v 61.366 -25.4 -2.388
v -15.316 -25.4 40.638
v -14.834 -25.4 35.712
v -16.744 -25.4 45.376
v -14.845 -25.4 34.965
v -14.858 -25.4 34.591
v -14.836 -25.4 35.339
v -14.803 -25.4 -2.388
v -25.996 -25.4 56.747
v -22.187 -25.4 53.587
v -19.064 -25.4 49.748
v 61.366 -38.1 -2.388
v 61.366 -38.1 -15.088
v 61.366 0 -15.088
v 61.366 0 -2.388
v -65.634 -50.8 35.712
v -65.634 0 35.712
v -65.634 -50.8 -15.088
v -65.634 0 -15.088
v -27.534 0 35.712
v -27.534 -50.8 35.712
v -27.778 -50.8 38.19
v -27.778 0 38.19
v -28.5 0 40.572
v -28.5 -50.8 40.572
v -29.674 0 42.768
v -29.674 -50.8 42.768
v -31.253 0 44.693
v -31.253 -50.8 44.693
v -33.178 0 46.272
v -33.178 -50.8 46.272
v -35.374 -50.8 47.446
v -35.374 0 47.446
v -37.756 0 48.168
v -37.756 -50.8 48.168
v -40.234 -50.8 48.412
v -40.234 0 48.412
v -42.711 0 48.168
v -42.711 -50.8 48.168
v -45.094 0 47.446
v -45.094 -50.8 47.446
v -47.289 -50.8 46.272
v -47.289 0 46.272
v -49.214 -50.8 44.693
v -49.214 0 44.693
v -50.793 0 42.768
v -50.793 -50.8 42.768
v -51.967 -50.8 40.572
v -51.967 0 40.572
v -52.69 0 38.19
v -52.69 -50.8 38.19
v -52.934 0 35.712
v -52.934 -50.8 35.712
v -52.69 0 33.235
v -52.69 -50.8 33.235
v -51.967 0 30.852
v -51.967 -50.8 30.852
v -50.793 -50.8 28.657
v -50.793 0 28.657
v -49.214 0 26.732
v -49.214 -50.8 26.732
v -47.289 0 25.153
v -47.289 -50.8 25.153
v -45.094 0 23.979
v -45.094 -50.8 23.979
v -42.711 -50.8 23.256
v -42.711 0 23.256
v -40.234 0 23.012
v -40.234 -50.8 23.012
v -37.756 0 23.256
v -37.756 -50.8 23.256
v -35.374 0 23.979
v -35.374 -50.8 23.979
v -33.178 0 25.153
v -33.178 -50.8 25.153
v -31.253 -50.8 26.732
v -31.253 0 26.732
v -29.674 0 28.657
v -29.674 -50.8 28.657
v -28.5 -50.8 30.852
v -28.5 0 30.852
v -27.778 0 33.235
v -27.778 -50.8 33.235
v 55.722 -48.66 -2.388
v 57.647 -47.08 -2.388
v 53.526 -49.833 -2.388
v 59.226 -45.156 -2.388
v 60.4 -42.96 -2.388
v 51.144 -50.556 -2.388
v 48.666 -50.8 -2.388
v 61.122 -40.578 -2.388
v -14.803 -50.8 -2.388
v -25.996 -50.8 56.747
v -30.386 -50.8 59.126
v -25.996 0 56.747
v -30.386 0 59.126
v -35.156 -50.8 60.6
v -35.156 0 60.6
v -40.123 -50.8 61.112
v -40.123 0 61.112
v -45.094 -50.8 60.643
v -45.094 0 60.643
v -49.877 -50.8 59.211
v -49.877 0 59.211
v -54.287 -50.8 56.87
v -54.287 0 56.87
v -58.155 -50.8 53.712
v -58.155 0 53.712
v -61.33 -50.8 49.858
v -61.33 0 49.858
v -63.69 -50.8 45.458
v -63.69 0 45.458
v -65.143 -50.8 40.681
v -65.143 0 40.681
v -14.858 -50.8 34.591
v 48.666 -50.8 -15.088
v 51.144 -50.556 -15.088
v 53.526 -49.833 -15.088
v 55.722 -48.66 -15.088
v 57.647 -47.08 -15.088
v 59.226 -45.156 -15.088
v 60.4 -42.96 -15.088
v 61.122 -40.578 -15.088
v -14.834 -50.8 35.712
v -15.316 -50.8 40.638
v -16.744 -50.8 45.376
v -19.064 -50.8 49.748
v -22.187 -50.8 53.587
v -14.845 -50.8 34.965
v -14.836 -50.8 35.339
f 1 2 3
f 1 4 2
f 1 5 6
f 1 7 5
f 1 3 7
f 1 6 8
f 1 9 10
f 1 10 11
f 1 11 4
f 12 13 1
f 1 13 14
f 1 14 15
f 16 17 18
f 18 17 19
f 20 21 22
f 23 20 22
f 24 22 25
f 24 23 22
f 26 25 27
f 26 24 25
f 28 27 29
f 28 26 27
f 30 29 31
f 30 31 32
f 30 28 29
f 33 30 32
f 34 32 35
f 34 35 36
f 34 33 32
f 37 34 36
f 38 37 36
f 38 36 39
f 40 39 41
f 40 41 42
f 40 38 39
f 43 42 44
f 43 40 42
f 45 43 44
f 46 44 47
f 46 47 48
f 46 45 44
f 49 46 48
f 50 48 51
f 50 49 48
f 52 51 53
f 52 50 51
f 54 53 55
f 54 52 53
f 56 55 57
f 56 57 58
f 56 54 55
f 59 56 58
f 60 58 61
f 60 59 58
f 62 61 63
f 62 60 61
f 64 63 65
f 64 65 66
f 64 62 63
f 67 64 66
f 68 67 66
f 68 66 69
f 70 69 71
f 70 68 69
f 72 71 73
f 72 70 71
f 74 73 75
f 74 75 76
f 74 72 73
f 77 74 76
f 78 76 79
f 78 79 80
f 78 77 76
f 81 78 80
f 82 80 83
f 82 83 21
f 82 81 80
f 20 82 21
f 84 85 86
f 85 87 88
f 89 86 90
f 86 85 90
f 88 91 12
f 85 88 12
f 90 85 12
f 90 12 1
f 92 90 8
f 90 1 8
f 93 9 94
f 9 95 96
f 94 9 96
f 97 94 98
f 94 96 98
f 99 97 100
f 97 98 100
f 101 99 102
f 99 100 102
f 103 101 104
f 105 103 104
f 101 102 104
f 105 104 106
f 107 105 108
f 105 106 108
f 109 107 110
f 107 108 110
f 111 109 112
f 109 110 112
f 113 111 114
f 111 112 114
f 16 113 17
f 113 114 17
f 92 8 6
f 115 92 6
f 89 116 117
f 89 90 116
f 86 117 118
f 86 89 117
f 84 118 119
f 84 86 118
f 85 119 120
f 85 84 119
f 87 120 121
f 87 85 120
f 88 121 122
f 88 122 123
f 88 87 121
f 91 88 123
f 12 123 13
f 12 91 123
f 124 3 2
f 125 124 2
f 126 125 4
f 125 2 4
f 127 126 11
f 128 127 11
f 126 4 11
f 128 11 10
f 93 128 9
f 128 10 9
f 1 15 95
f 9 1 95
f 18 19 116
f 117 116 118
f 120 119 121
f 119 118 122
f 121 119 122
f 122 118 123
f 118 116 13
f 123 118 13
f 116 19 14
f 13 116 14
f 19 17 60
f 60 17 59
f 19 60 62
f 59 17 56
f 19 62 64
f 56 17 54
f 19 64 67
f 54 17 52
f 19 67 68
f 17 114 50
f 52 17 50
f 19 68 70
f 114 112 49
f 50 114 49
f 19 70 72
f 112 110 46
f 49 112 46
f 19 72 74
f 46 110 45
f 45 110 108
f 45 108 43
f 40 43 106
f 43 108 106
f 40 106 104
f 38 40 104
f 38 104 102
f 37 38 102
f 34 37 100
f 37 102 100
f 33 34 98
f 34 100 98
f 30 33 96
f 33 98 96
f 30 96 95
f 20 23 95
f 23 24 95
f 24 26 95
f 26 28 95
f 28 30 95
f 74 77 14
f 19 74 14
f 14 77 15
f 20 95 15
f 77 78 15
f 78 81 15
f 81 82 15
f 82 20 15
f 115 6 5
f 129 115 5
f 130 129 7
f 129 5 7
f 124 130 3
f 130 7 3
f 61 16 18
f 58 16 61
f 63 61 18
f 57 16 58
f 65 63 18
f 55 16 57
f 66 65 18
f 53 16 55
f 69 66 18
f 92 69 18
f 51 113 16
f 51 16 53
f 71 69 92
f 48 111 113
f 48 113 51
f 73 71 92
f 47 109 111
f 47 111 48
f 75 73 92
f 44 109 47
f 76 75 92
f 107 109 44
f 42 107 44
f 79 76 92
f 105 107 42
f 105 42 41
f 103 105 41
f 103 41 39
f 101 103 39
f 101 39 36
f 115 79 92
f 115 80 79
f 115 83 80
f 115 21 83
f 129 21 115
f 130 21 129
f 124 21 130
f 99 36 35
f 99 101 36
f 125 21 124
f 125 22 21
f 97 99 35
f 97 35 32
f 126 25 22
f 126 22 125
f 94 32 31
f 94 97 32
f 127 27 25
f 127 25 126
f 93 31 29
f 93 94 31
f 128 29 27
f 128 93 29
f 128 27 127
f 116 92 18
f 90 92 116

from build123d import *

# Parameters (mm, degrees)
F0_R     = 12.7
F1_DEPTH = 25.4
F2_R     = 12.7
F3_DEPTH = 25.4
F4_R     = 12.7


with BuildPart() as f1:
    # F0 (on Front) → F1 (new body)
    with BuildSketch(Plane.XZ):
        with BuildLine():
            Line((61.366399, -2.3876), (-25.995728, 56.746728))
            ThreePointArc((-25.995728, 56.746728), (-52.13986, 58.148999), (-65.633601, 35.7124))
            Line((-65.633601, 35.7124), (-65.633601, -15.0876))
            Line((-65.633601, -15.0876), (61.366399, -15.0876))
            Line((61.366399, -15.0876), (61.366399, -2.3876))
        make_face()
        with Locations((-40.233601, 35.7124)):
            Circle(F0_R, mode=Mode.SUBTRACT)
    extrude(amount=F1_DEPTH)

    # F2 (on face) → F3 (join)
    with BuildSketch(Plane.XZ.offset(25.4)):
        with BuildLine():
            Line((-14.802516, -2.3876), (-14.858348, 34.591433))
            ThreePointArc((-14.858348, 34.591433), (-40.794221, 10.318588), (-65.633601, 35.7124))
            Line((-65.633601, 35.7124), (-65.633601, -2.3876))
            Line((-65.633601, -2.3876), (-65.633601, -15.0876))
            Line((-65.633601, -15.0876), (61.366399, -15.0876))
            Line((61.366399, -15.0876), (61.366399, -2.3876))
            Line((61.366399, -2.3876), (-14.802516, -2.3876))
        make_face()
        with BuildLine():
            ThreePointArc((-14.858348, 34.591433), (-14.839789, 35.15178), (-14.833601, 35.7124))
            ThreePointArc((-14.833601, 35.7124), (-17.797002, 47.618659), (-25.995728, 56.746728))
            ThreePointArc((-25.995728, 56.746728), (-52.13986, 58.148999), (-65.633601, 35.7124))
            ThreePointArc((-65.633601, 35.7124), (-40.794221, 10.318588), (-14.858348, 34.591433))
        make_face()
        with Locations((-40.233601, 35.7124)):
            Circle(F2_R, mode=Mode.SUBTRACT)
    extrude(amount=F3_DEPTH)

    # F4
    f4_edges = [f1.edges().sort_by_distance(p)[0] for p in [
        (61.366399, -50.8, -8.7376),
    ]]
    fillet(f4_edges, radius=F4_R)


solid = f1.part
